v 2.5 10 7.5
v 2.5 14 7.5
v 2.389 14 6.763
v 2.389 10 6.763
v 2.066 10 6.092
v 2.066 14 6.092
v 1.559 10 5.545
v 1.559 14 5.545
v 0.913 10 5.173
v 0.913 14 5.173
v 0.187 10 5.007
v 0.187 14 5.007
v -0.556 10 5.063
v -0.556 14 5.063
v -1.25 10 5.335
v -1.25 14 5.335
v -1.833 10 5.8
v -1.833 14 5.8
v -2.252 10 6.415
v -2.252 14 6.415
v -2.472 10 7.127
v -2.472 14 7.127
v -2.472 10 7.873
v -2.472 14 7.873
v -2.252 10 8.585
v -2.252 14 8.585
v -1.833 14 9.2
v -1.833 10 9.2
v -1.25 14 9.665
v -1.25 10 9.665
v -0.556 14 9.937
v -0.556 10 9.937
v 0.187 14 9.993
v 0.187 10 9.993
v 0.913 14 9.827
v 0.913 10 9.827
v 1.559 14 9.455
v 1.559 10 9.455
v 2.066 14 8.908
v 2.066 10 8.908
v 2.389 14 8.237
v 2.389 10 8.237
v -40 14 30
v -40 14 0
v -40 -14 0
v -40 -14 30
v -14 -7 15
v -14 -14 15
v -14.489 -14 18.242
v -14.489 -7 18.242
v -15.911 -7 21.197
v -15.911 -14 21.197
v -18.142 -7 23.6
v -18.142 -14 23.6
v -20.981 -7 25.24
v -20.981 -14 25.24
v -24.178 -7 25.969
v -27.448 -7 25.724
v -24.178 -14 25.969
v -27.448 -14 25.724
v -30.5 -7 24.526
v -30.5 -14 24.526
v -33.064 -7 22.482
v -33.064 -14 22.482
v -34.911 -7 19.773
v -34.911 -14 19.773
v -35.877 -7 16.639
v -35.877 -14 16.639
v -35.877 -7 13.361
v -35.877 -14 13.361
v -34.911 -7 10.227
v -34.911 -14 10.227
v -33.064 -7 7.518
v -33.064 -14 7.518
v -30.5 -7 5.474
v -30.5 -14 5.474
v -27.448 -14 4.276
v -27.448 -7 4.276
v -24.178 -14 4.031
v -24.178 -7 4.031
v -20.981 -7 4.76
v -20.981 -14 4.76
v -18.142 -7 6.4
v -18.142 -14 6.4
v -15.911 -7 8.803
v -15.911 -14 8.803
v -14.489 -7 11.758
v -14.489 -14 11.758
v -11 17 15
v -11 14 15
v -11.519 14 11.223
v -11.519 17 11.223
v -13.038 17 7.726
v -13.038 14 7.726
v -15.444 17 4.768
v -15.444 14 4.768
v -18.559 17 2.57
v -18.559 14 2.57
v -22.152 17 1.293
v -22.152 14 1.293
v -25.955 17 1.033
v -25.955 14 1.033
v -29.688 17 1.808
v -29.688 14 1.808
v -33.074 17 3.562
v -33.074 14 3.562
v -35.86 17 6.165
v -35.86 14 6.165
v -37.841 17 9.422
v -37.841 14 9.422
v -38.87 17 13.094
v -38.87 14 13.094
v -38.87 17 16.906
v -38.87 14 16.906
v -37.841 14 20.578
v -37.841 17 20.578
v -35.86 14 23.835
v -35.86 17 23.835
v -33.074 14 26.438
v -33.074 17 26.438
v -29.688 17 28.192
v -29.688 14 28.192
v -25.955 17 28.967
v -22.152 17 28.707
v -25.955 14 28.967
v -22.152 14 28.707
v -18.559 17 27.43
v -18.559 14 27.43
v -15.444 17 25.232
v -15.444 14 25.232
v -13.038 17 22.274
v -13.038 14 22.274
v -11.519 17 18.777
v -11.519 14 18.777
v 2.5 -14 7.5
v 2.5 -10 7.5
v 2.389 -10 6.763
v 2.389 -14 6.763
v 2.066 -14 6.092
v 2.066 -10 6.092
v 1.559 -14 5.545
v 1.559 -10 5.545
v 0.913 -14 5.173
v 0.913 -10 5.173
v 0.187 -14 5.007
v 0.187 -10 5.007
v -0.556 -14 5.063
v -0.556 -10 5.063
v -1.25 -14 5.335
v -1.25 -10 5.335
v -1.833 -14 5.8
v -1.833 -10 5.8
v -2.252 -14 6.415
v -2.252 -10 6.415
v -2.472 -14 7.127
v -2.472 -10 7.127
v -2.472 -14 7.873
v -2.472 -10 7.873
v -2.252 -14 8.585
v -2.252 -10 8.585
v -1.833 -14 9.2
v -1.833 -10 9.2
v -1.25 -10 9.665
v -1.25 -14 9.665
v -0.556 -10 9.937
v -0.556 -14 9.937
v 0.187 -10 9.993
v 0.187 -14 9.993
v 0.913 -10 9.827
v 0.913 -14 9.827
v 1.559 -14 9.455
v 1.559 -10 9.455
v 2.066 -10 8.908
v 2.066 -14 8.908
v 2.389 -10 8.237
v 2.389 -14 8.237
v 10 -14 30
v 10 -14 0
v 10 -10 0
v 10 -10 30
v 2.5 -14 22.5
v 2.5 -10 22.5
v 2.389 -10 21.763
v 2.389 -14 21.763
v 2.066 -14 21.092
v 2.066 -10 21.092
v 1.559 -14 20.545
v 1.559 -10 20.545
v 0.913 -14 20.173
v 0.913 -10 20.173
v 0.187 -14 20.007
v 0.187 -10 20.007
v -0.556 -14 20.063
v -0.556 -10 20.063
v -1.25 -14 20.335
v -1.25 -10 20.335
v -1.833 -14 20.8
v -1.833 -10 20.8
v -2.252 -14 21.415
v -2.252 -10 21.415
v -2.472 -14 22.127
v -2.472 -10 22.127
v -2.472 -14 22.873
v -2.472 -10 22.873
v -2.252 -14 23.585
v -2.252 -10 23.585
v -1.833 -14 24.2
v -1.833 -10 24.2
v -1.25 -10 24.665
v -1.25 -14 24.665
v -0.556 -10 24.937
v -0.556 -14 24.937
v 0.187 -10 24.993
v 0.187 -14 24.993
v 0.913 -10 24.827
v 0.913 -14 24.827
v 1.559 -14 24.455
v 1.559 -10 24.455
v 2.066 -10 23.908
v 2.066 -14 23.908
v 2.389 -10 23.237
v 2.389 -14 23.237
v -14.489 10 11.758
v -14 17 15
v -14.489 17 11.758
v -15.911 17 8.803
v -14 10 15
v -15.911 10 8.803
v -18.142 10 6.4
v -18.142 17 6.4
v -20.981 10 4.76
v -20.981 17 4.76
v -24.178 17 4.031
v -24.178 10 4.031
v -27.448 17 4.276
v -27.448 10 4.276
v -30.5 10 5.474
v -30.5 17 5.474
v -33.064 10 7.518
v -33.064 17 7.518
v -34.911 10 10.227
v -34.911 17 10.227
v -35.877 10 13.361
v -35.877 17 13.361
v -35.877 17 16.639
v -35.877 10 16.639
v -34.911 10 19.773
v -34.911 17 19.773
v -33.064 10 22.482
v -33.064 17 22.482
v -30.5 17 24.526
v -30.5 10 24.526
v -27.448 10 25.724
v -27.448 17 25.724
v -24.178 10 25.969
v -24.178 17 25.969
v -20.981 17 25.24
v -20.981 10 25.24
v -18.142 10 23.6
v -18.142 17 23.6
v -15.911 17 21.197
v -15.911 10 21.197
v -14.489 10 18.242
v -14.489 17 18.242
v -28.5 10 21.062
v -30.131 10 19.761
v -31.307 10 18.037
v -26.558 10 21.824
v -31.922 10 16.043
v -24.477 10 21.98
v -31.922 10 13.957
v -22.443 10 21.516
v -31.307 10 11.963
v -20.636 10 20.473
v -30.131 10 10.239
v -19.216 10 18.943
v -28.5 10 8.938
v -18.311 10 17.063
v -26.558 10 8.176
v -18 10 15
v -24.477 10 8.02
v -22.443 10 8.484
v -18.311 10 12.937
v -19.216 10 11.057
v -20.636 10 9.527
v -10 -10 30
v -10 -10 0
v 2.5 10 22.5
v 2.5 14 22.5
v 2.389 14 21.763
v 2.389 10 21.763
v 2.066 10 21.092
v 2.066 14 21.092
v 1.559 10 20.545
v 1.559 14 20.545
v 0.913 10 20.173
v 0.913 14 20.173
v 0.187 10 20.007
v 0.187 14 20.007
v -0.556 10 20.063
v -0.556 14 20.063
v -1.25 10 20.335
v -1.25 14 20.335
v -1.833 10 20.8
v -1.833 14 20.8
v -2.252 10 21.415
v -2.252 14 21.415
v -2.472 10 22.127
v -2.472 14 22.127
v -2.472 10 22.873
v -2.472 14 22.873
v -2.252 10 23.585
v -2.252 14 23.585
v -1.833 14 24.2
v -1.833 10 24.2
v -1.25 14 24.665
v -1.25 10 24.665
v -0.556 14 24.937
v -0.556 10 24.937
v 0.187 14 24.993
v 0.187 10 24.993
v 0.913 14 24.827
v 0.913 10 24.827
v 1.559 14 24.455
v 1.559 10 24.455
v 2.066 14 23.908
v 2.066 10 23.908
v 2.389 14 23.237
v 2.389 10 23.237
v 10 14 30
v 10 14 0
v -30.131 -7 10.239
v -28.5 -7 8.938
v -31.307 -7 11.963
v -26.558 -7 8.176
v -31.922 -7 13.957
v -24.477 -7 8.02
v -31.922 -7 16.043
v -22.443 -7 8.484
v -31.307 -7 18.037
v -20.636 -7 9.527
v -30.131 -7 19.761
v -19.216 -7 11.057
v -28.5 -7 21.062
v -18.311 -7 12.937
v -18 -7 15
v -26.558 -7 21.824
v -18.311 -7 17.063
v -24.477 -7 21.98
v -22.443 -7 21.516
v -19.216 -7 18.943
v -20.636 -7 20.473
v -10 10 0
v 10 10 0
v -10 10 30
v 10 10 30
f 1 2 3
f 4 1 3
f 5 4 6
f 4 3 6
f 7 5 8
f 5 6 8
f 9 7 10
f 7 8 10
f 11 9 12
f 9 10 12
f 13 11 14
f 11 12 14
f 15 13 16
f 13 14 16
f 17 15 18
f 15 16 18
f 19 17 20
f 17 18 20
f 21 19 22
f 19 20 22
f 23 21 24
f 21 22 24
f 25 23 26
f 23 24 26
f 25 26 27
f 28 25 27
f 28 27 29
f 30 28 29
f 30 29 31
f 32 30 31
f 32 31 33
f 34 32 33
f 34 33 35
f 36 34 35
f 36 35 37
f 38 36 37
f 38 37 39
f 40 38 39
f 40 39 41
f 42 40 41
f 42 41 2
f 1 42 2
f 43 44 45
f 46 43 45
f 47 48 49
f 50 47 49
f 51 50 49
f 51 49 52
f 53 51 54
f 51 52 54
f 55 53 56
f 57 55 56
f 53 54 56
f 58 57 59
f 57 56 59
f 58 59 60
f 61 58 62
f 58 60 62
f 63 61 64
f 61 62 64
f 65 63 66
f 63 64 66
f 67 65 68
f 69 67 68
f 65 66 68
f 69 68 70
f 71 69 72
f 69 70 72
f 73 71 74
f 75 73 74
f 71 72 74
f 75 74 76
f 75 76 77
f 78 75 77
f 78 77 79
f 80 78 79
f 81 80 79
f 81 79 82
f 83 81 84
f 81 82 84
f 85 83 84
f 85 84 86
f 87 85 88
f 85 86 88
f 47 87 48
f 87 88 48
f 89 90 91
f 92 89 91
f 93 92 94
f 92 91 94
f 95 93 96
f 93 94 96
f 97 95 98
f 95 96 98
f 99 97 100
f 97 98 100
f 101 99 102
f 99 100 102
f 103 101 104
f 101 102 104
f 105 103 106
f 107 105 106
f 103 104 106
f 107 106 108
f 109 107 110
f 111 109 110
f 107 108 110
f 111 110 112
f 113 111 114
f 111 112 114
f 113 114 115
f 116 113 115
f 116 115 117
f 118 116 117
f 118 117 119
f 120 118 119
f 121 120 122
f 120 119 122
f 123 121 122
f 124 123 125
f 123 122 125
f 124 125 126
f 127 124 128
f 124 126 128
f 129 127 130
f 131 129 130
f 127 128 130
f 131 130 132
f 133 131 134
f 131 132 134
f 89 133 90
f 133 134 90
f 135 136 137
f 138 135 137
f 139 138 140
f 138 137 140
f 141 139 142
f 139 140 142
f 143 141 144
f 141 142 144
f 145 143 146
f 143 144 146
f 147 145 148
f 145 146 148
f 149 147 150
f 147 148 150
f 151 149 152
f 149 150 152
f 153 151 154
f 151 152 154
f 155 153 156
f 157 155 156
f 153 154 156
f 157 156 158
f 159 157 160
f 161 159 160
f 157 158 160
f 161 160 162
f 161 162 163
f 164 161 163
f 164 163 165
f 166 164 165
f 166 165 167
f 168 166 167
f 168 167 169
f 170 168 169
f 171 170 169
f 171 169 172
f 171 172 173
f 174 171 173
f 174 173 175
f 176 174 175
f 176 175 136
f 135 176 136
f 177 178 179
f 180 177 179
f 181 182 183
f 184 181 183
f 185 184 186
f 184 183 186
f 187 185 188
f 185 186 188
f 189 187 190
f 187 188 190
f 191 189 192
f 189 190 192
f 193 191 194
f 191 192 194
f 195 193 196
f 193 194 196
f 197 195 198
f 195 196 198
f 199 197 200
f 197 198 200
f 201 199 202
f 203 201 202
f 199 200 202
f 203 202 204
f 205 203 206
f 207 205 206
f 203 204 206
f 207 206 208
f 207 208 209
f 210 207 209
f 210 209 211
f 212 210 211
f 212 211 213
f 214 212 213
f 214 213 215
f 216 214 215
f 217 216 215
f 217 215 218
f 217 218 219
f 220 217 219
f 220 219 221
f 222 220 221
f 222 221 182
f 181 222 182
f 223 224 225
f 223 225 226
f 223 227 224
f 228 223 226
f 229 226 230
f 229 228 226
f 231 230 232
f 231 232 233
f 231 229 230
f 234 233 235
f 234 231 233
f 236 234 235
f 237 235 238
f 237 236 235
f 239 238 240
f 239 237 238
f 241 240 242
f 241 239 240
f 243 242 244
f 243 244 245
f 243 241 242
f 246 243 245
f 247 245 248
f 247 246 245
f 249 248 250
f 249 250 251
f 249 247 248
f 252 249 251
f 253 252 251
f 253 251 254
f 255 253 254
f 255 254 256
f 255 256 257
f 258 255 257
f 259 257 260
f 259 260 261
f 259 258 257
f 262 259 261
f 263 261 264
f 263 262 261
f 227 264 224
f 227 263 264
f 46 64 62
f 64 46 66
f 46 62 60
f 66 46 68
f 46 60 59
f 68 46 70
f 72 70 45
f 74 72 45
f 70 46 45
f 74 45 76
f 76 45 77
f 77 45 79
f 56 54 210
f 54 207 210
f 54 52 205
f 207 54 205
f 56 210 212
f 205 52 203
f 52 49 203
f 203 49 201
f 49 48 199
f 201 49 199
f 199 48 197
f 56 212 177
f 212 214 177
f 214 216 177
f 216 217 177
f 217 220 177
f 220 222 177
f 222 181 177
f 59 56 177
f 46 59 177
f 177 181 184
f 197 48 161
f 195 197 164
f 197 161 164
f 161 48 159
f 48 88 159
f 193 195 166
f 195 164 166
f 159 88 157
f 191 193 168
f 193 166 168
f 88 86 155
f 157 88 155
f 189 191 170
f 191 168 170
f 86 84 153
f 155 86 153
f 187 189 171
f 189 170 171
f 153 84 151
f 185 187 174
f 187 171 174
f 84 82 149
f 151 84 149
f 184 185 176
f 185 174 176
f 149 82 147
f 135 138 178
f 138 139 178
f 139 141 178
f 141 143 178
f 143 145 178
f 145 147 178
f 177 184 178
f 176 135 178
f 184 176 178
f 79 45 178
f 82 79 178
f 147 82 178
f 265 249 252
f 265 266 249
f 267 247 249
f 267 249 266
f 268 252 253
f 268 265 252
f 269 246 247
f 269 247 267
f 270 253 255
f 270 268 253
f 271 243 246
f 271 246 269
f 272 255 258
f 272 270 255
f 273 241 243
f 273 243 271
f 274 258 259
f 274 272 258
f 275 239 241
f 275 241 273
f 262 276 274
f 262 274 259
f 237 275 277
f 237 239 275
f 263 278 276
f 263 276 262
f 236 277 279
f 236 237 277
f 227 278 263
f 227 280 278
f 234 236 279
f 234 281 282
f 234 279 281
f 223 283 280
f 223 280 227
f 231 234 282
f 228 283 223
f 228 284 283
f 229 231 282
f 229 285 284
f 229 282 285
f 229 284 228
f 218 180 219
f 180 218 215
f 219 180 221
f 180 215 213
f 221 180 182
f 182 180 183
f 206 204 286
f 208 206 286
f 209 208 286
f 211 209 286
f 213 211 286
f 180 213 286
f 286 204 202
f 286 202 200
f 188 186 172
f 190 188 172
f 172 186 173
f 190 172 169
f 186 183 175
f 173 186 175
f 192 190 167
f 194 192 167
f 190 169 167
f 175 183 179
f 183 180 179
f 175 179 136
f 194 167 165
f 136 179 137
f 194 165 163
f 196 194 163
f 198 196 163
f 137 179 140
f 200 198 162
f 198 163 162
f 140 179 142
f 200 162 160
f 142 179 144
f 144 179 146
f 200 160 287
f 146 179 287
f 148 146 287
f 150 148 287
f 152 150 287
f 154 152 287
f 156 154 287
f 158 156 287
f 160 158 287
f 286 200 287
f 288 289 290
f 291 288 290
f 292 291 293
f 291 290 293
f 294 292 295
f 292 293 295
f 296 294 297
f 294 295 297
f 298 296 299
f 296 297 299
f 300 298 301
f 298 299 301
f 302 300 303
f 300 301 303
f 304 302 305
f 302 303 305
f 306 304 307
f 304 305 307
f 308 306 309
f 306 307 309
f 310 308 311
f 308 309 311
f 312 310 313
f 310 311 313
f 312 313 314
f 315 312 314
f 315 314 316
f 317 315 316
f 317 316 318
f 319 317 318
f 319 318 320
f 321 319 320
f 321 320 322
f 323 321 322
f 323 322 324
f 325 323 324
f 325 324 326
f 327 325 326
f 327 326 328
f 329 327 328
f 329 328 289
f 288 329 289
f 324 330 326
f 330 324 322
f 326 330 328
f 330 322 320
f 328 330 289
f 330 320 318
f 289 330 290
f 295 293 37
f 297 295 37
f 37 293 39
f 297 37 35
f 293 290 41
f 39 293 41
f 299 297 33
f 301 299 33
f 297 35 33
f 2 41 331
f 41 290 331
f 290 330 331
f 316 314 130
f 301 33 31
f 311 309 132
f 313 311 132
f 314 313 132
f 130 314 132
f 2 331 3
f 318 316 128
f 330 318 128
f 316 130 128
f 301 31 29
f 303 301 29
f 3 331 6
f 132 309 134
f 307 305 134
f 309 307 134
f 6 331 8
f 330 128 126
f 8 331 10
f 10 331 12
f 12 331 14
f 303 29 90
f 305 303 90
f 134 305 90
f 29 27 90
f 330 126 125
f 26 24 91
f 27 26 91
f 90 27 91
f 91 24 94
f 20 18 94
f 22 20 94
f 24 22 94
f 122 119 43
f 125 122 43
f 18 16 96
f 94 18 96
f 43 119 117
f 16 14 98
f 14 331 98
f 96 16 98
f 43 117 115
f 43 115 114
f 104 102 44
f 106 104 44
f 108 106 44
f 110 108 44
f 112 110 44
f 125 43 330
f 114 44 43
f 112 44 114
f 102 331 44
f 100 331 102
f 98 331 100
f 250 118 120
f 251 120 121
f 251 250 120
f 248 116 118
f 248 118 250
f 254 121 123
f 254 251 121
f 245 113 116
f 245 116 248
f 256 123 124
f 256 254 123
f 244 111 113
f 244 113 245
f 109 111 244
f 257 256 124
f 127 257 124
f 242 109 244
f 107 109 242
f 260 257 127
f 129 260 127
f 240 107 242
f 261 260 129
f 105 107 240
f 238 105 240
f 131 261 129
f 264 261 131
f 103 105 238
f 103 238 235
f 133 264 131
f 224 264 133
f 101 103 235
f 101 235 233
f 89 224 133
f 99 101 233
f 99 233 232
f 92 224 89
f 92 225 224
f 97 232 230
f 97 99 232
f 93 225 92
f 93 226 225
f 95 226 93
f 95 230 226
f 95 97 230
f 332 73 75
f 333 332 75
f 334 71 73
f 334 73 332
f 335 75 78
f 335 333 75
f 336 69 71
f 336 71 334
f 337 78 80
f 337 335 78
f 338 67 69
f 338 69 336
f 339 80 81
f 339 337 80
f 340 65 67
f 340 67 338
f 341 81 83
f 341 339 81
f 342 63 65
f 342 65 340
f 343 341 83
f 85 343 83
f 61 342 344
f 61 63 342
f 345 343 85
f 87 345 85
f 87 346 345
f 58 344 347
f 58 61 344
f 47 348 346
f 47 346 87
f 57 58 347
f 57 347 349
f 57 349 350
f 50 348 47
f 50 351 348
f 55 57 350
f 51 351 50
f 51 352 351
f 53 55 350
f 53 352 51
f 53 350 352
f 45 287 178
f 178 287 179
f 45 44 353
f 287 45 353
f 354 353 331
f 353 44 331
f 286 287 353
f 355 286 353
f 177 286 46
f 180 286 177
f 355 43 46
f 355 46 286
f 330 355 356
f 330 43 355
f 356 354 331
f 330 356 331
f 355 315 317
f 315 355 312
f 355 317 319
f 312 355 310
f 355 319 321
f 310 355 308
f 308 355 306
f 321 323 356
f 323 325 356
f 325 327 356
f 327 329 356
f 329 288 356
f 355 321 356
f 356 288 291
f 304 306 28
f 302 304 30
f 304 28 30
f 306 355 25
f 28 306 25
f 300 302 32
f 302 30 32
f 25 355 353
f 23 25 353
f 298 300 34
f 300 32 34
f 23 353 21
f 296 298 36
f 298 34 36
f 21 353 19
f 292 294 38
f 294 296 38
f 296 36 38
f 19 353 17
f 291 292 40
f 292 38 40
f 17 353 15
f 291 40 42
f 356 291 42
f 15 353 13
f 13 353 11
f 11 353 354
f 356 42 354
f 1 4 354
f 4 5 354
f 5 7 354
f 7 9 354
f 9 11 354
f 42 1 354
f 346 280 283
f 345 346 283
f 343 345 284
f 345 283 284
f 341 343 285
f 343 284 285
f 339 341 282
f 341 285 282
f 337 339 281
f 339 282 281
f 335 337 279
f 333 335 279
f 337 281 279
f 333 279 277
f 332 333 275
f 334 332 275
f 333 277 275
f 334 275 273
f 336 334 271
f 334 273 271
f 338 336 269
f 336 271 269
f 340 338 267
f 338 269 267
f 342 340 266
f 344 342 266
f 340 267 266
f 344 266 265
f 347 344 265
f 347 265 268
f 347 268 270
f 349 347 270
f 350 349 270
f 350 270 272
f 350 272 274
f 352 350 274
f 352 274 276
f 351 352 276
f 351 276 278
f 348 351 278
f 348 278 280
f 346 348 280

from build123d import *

# Parameters (mm, degrees)
BOSS_EXTRUDE1_DEPTH = 30
SKETCH2_R           = 7
CUT_EXTRUDE1_DEPTH  = 29
SKETCH3_R           = 11
CUT_EXTRUDE2_DEPTH  = 4
SKETCH4_R           = 11
CUT_EXTRUDE3_DEPTH  = 7
SKETCH5_R           = 2.5
CUT_EXTRUDE4_DEPTH  = 29
SKETCH6_R           = 14
SKETCH6_R_2         = 11
BOSS_EXTRUDE2_DEPTH = 3


with BuildPart() as part:
    # Sketch1 → Boss-Extrude1 (new body)
    with BuildSketch(Plane.XY):
        Polygon((10, 10), (10, 14), (-40, 14), (-40, -14), (10, -14), (10, -10), (-10, -10), (-10, 10), align=None)
    extrude(amount=BOSS_EXTRUDE1_DEPTH)

    # Sketch2 → Cut-Extrude1 (cut, through all)
    with BuildSketch(Plane(origin=(0, 14, 0), x_dir=(1, 0, 0), z_dir=(0, 1, 0))):
        with Locations((-25, -15)):
            Circle(SKETCH2_R)
    extrude(amount=-CUT_EXTRUDE1_DEPTH, mode=Mode.SUBTRACT)

    # Sketch3 → Cut-Extrude2 (cut)
    with BuildSketch(Plane(origin=(0, 14, 0), x_dir=(1, 0, 0), z_dir=(0, 1, 0))):
        with Locations((-25, -15)):
            Circle(SKETCH3_R)
    extrude(amount=-CUT_EXTRUDE2_DEPTH, mode=Mode.SUBTRACT)

    # Sketch4 → Cut-Extrude3 (cut)
    with BuildSketch(Plane.XZ.offset(14)):
        with Locations((-25, 15)):
            Circle(SKETCH4_R)
    extrude(amount=-CUT_EXTRUDE3_DEPTH, mode=Mode.SUBTRACT)

    # Sketch5 → Cut-Extrude4 (cut, through all)
    with BuildSketch(Plane(origin=(0, 14, 0), x_dir=(1, 0, 0), z_dir=(0, 1, 0))):
        with Locations((0, -22.5)):
            Circle(SKETCH5_R)
        with Locations((0, -7.5)):
            Circle(SKETCH5_R)
    extrude(amount=-CUT_EXTRUDE4_DEPTH, mode=Mode.SUBTRACT)

    # Sketch6 → Boss-Extrude2 (add)
    with BuildSketch(Plane(origin=(0, 14, 0), x_dir=(1, 0, 0), z_dir=(0, 1, 0))):
        with Locations((-25, -15)):
            Circle(SKETCH6_R)
        with Locations((-25, -15)):
            Circle(SKETCH6_R_2, mode=Mode.SUBTRACT)
    extrude(amount=BOSS_EXTRUDE2_DEPTH)


solid = part.part
